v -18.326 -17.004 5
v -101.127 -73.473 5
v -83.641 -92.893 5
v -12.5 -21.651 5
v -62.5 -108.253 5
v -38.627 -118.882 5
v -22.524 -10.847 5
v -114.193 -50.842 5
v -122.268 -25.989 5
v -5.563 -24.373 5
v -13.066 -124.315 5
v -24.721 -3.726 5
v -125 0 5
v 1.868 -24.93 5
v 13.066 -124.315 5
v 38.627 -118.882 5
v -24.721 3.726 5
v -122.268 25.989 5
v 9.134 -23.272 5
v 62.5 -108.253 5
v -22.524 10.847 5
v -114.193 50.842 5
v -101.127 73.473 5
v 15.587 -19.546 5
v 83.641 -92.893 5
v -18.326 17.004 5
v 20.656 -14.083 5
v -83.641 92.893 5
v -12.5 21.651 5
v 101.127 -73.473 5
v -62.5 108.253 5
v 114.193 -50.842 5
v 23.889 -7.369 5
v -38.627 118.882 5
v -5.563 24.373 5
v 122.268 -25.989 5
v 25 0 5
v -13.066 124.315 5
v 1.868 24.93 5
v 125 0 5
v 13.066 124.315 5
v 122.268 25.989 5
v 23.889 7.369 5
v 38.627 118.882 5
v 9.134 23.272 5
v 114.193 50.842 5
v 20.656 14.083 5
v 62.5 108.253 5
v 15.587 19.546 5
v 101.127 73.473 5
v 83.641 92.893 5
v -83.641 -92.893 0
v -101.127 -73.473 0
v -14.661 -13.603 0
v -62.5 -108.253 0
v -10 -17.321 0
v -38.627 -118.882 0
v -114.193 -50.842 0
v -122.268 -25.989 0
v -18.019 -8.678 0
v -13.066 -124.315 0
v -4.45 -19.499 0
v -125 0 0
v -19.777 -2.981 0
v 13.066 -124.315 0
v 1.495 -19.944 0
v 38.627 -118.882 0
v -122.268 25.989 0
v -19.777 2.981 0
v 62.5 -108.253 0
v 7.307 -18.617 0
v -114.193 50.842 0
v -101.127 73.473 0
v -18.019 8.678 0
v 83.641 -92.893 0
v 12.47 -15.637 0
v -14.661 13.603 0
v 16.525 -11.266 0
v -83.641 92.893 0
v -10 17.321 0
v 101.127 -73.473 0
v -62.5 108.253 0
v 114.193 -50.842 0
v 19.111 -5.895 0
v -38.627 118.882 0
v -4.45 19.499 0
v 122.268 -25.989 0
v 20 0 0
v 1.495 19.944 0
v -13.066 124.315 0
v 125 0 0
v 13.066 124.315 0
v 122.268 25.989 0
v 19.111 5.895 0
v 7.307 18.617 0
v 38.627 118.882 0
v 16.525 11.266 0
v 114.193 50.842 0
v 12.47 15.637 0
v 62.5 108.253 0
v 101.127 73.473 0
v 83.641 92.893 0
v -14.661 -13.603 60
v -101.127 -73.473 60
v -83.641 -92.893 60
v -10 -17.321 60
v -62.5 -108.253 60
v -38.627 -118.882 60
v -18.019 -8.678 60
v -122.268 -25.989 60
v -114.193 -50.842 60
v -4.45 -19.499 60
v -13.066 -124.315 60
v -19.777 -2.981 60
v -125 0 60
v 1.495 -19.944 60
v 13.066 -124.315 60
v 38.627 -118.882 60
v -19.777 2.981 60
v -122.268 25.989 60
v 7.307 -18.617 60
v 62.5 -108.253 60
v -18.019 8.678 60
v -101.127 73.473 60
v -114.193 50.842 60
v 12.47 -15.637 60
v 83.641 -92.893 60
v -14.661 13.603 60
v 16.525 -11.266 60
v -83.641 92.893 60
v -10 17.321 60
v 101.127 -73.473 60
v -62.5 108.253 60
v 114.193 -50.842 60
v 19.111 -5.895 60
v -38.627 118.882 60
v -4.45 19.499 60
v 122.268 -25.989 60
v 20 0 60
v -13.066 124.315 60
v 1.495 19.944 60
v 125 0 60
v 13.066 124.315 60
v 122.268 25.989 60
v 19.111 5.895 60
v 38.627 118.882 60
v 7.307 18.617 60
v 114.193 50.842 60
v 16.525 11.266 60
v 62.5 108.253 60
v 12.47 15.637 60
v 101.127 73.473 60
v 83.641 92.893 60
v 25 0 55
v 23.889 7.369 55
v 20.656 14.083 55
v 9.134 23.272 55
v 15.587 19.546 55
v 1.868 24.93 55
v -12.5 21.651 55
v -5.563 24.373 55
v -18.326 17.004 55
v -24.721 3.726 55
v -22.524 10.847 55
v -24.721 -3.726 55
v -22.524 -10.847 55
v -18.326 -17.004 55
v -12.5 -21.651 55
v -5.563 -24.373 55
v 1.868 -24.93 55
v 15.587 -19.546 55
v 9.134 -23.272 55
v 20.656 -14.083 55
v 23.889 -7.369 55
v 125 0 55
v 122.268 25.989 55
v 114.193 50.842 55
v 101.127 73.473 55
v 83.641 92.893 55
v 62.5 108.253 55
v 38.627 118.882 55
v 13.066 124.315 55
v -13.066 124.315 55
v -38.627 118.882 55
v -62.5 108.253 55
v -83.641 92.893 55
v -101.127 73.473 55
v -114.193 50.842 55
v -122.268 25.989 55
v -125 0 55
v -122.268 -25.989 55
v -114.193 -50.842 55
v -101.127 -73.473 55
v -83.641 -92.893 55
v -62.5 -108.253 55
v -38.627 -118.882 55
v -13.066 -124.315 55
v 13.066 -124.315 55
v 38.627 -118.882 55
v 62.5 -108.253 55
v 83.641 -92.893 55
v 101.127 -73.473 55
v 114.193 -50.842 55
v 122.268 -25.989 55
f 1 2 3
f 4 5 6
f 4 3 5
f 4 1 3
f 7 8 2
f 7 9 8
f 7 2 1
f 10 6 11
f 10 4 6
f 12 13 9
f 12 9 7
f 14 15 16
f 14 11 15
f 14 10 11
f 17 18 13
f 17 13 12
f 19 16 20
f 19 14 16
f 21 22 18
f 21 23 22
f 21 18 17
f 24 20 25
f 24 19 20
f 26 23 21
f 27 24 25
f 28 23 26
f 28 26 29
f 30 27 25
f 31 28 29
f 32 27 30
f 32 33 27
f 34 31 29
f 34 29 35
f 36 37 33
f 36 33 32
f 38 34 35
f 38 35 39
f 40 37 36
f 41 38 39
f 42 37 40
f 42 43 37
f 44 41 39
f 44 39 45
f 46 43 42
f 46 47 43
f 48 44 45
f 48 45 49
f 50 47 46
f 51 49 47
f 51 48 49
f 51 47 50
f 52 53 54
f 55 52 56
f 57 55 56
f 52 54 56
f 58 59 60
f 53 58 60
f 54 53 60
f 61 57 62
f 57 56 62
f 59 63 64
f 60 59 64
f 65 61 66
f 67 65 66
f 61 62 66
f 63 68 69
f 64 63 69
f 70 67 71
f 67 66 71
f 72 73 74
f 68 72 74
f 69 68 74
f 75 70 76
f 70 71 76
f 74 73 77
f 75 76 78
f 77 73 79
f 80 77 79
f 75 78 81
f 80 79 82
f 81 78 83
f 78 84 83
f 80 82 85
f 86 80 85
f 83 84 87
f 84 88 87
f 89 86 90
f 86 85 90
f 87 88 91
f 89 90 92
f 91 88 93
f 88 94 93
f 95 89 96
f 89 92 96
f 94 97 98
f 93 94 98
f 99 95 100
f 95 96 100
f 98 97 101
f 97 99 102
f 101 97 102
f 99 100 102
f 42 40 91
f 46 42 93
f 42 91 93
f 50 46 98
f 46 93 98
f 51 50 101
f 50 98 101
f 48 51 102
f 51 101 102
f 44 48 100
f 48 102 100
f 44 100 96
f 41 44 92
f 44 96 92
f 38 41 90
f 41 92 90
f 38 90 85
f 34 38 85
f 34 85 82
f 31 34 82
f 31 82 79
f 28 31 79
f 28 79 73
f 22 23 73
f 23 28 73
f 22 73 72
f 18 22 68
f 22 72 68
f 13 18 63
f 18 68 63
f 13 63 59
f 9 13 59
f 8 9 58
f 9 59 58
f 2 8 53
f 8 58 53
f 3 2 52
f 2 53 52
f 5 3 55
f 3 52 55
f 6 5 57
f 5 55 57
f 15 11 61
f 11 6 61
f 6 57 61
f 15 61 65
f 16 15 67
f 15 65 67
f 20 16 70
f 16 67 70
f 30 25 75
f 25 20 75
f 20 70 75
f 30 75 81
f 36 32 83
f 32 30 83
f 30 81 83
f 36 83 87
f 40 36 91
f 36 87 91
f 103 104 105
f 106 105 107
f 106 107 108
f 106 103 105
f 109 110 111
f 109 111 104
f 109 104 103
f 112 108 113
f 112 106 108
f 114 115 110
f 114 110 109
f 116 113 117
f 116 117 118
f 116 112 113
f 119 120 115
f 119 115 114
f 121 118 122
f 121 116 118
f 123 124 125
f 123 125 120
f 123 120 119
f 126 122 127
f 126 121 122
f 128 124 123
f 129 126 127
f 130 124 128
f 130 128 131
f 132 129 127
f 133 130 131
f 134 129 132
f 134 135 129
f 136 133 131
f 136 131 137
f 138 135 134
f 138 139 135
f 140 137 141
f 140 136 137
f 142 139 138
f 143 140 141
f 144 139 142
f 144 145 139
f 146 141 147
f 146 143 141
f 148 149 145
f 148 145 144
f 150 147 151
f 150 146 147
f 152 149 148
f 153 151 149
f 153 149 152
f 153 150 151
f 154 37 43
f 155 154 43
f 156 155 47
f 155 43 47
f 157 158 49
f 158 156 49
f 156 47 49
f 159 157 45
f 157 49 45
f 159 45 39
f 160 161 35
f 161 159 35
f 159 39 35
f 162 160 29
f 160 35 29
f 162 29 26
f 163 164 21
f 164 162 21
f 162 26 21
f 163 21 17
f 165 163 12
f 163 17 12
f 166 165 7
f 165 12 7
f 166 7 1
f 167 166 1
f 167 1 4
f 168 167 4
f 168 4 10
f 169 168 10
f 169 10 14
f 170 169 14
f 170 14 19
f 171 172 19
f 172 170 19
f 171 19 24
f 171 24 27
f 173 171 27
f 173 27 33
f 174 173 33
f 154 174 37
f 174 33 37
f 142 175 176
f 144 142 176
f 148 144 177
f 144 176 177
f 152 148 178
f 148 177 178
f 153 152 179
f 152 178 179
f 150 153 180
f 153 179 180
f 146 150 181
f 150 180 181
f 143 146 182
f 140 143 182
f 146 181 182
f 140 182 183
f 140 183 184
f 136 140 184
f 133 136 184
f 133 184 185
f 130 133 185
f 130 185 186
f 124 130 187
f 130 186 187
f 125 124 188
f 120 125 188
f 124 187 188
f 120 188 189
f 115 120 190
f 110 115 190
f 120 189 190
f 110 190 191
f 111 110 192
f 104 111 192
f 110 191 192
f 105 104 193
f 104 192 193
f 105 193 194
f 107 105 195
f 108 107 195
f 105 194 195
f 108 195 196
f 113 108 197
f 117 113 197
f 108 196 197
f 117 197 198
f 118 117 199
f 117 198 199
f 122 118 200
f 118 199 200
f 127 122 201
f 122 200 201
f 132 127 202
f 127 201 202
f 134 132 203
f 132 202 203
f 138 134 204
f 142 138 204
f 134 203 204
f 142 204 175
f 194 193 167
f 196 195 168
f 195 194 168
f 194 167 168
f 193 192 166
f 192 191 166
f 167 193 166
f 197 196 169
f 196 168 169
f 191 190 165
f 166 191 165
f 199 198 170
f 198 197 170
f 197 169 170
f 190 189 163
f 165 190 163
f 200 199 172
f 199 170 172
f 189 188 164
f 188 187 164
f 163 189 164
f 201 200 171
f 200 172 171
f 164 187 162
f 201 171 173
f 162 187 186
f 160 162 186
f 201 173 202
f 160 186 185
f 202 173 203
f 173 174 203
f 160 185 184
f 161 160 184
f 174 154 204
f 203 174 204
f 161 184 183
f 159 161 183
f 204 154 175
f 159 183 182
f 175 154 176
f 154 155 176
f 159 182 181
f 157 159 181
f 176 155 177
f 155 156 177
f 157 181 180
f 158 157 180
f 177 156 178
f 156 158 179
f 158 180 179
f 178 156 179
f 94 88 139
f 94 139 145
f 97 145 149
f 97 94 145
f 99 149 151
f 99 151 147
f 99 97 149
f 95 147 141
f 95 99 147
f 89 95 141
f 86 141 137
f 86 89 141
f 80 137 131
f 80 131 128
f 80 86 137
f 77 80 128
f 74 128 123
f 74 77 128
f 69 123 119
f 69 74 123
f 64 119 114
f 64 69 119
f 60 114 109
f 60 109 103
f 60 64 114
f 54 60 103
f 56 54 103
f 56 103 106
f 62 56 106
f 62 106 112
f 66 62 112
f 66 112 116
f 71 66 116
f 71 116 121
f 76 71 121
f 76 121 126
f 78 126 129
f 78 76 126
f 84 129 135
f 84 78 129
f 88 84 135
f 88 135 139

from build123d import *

# Parameters (mm, degrees)
SKETCH1_R           = 125
SKETCH1_R_2         = 20
BOSS_EXTRUDE1_DEPTH = 60
SHELL1_T            = -5


with BuildPart() as part:
    # Sketch1 → Boss-Extrude1 (new body)
    with BuildSketch(Plane.XY):
        Circle(SKETCH1_R)
        Circle(SKETCH1_R_2, mode=Mode.SUBTRACT)
    extrude(amount=BOSS_EXTRUDE1_DEPTH)

    # Shell1
    shell1_openings = [part.faces().sort_by_distance(p)[0] for p in [
        (-125, 0, 30),
    ]]
    offset(amount=SHELL1_T, openings=shell1_openings, kind=Kind.INTERSECTION)


solid = part.part
